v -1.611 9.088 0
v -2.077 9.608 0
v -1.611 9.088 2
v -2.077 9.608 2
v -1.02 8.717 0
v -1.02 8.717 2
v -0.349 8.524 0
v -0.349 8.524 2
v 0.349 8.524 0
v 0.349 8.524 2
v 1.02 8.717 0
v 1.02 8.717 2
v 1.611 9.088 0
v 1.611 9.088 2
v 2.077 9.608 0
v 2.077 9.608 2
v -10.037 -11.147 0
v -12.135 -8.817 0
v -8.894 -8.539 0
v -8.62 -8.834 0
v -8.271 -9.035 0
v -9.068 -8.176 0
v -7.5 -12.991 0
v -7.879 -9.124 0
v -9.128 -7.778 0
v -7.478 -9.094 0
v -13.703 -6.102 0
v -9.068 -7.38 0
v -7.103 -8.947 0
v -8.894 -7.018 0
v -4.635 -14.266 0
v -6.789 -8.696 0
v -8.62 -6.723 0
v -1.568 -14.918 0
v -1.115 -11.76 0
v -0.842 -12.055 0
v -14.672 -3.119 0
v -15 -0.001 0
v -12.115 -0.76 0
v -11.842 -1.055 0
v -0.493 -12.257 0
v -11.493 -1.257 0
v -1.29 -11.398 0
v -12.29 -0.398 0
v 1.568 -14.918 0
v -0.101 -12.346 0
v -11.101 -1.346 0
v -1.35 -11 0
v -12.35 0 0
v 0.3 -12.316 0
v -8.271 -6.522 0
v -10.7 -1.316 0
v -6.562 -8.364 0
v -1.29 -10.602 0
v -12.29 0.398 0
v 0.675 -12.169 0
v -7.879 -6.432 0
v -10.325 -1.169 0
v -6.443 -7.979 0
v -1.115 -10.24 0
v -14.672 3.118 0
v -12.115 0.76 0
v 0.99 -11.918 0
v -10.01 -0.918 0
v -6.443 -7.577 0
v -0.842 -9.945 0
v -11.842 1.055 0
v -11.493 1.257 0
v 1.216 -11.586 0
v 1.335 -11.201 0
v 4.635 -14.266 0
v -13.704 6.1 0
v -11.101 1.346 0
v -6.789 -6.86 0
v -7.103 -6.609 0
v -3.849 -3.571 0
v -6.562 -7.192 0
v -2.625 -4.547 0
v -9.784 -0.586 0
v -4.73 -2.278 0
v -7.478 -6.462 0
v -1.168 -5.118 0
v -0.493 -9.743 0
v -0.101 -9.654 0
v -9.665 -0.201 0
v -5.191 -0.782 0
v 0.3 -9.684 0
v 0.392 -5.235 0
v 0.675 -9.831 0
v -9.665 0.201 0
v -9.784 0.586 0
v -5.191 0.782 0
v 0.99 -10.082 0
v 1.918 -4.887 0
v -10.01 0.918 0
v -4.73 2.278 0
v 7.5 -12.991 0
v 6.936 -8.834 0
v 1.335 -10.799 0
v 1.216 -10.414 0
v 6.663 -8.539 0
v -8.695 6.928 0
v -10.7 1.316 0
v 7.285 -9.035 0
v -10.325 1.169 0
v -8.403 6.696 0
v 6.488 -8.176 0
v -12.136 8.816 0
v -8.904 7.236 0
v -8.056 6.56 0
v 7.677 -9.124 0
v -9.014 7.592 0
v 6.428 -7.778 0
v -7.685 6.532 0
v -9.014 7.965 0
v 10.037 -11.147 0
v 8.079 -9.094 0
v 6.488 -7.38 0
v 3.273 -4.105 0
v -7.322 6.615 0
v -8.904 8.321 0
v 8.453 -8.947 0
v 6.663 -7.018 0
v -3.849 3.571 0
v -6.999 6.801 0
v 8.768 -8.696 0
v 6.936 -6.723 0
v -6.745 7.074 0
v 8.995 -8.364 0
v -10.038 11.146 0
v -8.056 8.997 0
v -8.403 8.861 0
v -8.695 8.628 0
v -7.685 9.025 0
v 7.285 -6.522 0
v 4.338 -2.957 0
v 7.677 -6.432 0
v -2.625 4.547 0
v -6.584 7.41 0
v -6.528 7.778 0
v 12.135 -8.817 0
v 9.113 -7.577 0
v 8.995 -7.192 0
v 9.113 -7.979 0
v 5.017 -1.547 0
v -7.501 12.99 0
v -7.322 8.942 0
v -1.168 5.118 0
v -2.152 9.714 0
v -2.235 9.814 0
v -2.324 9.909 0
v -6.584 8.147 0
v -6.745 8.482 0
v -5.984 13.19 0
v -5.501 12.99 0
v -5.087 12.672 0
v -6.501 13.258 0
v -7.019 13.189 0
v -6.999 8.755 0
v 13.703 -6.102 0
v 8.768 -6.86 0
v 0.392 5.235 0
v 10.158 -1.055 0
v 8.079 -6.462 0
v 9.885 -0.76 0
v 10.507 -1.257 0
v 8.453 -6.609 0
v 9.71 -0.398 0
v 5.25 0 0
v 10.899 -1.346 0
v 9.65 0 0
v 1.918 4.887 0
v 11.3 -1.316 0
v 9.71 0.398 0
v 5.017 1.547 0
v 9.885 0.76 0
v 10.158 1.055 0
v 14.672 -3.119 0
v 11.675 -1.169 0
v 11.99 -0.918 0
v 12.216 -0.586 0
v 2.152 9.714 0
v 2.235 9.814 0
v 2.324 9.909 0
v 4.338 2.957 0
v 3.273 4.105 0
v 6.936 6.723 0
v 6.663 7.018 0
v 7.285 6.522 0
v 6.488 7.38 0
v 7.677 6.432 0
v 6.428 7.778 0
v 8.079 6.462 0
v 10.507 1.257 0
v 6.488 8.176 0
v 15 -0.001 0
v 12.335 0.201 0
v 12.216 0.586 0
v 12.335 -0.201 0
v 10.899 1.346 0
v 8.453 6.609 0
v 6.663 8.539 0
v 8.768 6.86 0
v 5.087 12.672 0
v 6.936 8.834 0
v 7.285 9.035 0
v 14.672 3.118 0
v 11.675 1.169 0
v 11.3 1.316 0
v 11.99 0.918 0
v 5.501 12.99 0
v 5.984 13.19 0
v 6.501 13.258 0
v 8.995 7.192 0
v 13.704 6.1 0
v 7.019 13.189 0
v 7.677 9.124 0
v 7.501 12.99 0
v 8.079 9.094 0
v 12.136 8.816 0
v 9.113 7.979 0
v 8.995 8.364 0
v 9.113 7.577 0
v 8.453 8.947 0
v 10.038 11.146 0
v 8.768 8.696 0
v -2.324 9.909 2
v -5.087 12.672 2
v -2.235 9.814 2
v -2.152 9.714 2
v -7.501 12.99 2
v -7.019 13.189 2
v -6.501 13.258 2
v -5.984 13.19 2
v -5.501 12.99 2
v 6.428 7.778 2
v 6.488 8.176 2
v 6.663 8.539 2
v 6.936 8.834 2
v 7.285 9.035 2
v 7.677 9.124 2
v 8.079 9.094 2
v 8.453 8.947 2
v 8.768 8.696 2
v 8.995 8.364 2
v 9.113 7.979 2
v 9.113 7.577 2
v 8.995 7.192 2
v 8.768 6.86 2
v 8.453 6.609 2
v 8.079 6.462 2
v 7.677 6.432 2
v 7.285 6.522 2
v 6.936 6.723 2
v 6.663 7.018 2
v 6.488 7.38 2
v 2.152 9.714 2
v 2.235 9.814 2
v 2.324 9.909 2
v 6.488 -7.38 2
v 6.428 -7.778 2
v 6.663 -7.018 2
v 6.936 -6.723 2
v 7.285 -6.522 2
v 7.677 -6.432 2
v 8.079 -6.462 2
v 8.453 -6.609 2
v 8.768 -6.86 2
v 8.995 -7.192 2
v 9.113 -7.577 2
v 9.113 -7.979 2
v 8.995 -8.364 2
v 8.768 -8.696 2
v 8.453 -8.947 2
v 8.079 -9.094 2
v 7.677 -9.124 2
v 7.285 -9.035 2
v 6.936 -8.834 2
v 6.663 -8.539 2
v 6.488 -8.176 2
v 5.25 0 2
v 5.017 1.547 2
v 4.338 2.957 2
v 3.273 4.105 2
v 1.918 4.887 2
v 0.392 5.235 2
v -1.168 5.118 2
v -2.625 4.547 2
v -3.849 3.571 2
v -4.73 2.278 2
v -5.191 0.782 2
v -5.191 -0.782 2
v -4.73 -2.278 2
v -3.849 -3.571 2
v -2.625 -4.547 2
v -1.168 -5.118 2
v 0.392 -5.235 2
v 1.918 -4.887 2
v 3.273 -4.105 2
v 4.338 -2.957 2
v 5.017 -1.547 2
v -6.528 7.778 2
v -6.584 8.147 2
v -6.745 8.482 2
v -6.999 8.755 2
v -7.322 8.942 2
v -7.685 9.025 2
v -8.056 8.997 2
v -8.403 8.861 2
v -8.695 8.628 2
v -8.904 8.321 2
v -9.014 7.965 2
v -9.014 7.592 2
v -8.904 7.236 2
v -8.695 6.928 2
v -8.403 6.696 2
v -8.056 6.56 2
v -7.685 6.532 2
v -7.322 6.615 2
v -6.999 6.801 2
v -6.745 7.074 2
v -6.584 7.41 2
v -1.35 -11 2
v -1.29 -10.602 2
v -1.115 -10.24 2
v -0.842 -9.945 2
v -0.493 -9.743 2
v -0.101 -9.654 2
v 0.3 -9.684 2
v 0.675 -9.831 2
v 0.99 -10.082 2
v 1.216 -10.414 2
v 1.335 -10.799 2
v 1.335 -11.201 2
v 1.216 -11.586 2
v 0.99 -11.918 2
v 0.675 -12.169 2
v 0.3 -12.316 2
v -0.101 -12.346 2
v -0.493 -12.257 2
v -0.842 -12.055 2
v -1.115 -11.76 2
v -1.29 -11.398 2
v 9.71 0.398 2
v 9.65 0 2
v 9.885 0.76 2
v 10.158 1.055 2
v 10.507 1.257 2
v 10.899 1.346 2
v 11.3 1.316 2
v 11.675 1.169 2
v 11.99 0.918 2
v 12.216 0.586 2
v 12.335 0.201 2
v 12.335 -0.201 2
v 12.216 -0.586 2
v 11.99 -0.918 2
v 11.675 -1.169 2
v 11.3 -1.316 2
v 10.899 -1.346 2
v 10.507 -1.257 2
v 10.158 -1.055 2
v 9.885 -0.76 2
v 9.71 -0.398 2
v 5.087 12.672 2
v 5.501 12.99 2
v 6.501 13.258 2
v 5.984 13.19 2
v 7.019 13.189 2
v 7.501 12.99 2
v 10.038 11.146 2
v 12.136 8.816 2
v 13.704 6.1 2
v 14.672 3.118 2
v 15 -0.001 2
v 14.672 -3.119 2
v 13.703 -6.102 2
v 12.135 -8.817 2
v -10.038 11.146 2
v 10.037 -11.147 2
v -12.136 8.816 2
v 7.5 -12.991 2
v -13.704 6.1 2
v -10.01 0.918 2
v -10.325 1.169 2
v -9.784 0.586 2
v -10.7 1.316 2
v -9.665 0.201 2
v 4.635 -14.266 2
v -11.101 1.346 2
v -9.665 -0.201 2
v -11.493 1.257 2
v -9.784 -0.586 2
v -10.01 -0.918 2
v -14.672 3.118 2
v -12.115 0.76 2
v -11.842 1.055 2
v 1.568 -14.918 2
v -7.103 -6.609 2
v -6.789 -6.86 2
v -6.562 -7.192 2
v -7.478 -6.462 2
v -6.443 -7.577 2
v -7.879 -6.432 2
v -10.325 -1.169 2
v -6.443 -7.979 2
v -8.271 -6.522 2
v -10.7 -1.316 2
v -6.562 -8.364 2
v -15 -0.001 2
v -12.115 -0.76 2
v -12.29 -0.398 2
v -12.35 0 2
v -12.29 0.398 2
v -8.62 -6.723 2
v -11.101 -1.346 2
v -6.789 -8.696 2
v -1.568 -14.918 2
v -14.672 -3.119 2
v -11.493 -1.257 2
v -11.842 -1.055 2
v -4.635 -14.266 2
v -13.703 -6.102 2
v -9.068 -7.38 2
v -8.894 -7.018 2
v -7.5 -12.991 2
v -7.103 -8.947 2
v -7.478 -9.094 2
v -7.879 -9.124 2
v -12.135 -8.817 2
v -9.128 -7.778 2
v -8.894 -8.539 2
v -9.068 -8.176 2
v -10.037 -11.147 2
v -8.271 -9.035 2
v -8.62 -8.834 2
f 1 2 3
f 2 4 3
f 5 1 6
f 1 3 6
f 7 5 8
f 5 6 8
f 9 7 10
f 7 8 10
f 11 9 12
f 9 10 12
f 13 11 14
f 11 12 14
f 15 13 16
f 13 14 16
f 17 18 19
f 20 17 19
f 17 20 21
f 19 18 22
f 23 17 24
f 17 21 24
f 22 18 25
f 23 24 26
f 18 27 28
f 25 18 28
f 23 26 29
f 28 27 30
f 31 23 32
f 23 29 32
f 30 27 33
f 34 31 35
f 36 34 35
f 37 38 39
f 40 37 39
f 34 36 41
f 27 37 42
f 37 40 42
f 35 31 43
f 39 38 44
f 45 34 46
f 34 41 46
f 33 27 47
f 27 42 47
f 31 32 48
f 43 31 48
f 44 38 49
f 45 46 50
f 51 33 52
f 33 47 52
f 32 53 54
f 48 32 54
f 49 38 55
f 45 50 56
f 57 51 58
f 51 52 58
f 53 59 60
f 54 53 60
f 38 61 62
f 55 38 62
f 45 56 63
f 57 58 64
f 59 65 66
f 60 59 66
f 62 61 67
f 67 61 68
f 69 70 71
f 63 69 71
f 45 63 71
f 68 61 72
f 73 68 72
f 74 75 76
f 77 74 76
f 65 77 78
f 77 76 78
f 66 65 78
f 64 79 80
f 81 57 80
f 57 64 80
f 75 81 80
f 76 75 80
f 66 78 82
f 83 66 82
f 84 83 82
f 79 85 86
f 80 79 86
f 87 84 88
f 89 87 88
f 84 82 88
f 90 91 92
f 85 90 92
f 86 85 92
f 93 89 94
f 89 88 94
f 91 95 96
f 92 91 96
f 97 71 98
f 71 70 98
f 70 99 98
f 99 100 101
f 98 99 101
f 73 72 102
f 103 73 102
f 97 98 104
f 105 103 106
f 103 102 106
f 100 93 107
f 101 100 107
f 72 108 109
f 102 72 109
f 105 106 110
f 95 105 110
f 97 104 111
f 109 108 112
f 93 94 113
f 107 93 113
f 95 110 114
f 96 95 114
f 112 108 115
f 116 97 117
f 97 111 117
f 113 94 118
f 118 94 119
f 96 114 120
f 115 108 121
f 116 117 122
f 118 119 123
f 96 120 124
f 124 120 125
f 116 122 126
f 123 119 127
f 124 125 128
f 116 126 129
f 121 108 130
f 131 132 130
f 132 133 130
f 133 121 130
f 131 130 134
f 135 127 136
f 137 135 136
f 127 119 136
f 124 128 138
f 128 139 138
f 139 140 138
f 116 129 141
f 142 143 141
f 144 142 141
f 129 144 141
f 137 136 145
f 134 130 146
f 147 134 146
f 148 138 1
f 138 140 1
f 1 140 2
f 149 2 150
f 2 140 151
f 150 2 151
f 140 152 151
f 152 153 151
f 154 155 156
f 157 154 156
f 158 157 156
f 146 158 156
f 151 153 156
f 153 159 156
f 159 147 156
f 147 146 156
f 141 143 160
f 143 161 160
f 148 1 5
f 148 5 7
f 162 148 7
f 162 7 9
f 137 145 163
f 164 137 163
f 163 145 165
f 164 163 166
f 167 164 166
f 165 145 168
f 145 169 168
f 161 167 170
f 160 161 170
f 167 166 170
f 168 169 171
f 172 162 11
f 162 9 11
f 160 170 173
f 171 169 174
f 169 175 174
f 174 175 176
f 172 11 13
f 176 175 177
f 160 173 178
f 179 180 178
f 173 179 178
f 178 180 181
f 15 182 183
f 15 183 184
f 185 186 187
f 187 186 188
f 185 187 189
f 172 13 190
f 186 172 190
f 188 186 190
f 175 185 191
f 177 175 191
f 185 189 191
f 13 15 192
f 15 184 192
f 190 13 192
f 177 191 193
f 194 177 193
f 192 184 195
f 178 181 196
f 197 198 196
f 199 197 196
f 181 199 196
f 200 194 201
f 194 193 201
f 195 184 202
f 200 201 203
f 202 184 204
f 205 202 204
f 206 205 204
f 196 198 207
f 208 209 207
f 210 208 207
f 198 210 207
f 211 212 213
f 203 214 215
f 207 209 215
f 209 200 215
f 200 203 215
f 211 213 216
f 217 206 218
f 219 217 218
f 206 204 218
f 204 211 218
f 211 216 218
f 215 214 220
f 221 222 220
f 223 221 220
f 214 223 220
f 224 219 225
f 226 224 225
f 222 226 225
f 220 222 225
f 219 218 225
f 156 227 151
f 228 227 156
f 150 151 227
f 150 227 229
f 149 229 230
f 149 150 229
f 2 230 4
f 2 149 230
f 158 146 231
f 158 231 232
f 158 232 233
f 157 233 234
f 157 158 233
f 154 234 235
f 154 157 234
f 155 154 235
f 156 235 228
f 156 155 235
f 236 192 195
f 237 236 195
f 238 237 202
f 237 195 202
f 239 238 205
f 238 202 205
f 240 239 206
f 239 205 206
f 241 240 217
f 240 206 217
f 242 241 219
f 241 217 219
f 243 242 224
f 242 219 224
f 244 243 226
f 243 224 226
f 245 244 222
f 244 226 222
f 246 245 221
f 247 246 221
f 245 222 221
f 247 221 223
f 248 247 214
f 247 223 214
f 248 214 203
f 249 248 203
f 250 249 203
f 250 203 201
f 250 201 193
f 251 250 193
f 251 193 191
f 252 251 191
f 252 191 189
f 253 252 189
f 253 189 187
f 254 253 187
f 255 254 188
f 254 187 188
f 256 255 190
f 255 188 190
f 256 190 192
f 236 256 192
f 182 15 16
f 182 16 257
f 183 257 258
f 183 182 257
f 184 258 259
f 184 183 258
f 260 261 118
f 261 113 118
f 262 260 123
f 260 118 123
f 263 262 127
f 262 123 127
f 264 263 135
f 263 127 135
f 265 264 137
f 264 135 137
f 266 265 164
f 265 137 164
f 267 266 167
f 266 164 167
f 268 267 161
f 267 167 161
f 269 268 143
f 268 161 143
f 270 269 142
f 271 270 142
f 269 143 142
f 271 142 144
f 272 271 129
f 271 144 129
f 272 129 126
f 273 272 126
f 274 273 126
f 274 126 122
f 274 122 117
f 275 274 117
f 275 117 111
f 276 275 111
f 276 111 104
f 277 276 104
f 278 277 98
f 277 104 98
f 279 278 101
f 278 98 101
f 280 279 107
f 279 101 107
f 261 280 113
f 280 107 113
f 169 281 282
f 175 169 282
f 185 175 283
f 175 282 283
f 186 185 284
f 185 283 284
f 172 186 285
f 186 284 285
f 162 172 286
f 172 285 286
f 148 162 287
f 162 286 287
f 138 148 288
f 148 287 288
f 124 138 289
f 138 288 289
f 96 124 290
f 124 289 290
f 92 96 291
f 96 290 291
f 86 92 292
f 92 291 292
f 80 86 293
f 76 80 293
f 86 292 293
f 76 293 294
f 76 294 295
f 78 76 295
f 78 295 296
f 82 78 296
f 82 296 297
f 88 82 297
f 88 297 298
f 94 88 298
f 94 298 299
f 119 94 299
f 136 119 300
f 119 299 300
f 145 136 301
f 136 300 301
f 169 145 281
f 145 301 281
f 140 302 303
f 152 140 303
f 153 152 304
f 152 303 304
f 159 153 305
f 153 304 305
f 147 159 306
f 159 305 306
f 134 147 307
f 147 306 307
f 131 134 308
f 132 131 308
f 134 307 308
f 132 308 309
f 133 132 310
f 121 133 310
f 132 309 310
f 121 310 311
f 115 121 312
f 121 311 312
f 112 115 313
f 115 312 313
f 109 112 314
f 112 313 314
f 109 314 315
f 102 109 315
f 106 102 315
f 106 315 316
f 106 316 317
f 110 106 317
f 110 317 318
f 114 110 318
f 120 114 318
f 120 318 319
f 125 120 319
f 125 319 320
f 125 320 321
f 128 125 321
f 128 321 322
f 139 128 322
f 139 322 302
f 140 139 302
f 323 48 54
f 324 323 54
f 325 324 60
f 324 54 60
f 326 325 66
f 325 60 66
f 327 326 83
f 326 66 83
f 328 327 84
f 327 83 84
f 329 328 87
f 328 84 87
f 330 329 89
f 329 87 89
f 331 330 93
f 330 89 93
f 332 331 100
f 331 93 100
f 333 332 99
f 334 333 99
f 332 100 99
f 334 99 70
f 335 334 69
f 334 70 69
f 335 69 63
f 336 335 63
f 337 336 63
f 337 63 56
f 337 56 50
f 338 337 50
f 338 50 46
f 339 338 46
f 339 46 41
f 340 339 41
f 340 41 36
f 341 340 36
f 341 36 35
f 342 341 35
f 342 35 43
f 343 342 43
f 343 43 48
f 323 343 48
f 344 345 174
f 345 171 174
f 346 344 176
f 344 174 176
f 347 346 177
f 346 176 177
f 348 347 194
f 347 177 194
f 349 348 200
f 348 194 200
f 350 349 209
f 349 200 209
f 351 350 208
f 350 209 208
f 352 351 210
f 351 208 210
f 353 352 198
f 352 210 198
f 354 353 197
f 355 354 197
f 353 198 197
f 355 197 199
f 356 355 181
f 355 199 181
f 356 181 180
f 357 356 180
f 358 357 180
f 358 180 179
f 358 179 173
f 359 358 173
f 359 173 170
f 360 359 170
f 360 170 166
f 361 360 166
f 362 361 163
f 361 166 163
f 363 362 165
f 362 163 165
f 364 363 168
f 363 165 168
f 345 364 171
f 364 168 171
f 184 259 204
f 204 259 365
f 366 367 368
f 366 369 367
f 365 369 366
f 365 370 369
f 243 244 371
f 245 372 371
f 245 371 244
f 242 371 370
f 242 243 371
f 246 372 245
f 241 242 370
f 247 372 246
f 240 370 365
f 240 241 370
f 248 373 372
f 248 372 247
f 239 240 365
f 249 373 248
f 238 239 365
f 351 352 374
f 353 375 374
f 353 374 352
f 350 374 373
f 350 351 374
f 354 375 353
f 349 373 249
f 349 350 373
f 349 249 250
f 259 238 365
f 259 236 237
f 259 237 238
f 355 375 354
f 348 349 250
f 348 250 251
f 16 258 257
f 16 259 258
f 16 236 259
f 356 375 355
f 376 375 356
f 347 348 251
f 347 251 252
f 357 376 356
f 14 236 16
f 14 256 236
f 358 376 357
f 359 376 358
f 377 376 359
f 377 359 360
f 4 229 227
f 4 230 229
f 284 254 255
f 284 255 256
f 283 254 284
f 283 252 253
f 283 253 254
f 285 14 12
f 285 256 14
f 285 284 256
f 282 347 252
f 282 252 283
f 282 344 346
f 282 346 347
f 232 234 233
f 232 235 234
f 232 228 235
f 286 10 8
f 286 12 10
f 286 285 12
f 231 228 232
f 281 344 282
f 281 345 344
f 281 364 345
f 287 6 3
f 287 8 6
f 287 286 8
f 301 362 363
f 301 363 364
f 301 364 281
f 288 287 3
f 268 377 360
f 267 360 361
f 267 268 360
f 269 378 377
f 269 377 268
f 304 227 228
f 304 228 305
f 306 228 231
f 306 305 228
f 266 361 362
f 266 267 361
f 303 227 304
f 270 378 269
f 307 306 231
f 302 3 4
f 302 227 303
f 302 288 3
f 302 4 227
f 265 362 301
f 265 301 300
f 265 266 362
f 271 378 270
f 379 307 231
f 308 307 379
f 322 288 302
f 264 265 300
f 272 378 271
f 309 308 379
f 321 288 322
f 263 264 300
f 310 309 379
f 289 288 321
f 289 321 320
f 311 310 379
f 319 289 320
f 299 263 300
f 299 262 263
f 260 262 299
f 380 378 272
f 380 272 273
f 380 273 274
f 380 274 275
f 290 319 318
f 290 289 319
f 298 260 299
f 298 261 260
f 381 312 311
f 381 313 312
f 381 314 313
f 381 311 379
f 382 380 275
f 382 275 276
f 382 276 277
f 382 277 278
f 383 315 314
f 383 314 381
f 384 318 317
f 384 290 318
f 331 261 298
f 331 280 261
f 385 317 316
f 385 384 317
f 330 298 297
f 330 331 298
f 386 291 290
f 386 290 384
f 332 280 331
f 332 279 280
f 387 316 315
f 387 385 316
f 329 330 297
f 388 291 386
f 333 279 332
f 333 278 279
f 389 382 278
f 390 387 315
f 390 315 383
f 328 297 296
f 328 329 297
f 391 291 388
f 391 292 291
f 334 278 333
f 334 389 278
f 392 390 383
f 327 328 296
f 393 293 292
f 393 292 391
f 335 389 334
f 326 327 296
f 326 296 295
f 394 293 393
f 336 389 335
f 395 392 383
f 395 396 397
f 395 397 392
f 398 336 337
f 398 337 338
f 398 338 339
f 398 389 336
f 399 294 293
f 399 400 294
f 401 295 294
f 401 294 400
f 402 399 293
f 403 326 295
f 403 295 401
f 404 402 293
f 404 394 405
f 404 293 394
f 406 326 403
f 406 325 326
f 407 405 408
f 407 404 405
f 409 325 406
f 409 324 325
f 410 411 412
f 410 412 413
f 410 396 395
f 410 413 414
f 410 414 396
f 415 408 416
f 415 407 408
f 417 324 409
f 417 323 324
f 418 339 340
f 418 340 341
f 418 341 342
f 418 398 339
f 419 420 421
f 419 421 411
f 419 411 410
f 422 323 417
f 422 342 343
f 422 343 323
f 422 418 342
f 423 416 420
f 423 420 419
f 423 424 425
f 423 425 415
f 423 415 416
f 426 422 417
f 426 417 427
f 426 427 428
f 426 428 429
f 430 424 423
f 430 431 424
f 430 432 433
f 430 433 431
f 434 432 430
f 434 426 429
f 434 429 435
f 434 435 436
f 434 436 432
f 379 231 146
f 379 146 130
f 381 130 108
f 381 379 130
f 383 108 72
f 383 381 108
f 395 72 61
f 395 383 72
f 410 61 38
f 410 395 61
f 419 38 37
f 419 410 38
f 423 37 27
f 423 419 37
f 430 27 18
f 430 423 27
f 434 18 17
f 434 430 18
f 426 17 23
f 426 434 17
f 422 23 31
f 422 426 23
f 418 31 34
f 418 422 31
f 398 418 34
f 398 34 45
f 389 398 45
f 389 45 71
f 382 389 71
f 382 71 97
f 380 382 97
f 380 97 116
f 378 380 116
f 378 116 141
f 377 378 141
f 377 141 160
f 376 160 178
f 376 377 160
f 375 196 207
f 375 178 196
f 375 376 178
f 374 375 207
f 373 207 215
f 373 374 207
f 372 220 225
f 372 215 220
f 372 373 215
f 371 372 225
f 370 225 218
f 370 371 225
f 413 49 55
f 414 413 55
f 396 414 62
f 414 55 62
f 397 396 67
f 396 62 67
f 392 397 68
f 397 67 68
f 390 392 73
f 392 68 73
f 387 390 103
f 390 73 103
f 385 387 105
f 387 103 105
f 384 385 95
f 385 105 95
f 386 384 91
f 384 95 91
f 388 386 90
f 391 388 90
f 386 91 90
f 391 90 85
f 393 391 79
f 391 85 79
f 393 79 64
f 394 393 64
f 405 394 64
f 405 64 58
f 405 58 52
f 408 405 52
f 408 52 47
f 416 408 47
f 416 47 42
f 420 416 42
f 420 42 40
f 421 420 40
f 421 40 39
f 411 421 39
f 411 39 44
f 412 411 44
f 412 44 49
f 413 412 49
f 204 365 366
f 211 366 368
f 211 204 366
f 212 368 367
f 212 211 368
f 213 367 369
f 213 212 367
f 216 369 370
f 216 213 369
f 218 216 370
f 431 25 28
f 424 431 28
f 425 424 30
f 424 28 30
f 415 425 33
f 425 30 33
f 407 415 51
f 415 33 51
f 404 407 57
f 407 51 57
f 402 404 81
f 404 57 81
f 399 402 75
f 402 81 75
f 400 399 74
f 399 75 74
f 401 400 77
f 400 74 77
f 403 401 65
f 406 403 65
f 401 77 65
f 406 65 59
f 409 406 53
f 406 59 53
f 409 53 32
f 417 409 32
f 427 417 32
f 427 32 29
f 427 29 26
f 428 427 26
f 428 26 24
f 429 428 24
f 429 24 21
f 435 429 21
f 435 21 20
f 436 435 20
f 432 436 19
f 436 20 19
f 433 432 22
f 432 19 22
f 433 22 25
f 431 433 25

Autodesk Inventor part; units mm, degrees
ref_plane "YZ Plane" through (0, 0, 0) normal (1, 0, 0) x (0, 1, 0)
ref_plane "XZ Plane" through (0, 0, 0) normal (0, 1, 0) x (-1, 0, 0)
ref_plane "XY Plane" through (0, 0, 0) normal (0, 0, 1) x (1, 0, 0)
sketch "Sketch1" plane through (0, 0, 0) normal (0, 0, 1) x (1, 0, 0)
  circle A0 centre (0, 0) radius 18
  dimension "d0" = 36
extrude "Extrusion1" add sketch "Sketch1" along normal blind 2.5
sketch "Sketch2" plane through (0, 0, 2.5) normal (0, 0, 1) x (1, 0, 0)
  line L0 (0, 0) -> (0, 11)
  circle A0 centre (0, 11) radius 1.25
  circle A1 centre (0, 0) radius 5
  circle A2 centre (7.7782, 7.7782) radius 1.25
  circle A3 centre (11, 0) radius 1.25
  circle A4 centre (7.7782, -7.7782) radius 1.25
  circle A5 centre (0, -11) radius 1.25
  circle A6 centre (-7.7782, -7.7782) radius 1.25
  circle A7 centre (-11, 0) radius 1.25
  circle A8 centre (-7.7782, 7.7782) radius 1.25
  dimension "d3" = 11
  dimension "d4" = 2.5
  dimension "d5" = 10
  dimension "d8" = 360
extrude "Extrusion2" cut sketch "Sketch2" against normal through all
sketch "Sketch3" plane through (0, 0, 2.5) normal (0, 0, 1) x (1, 0, 0)
  circle A0 centre (0, 0) radius 15
  circle A1 centre (0, 0) radius 18
  dimension "d12" = 30
extrude "Extrusion3" cut sketch "Sketch3" against normal through all
sketch "Sketch4" plane through (0, 0, 2.5) normal (0, 0, 1) x (1, 0, 0)
  circle A0 centre (0, 11) radius 1.25 projected
  arc A1 (-2.1651, 9.75) -> (2.1651, 9.75) centre (0, 11) ccw
  circle A2 centre (-7.7782, 7.7782) radius 1.25 projected
  circle A3 centre (7.7782, 7.7782) radius 1.25 projected
  circle A4 centre (0, 0) radius 5 projected
  line L0 (2.1651, 9.75) -> (6.1129, 13.6979)
  circle A5 centre (0, 0) radius 15 projected
  line L1 (2.1651, 9.75) -> (7.7482, 9.75) construction
  line L2 (-2.1651, 9.75) -> (-6.1129, 13.6979)
  line L3 (-2.1651, 9.75) -> (3.4181, 9.75) construction
  arc A6 (6.1129, 13.6979) -> (-6.1129, 13.6979) centre (0, 0) ccw
  dimension "d15" = 5
  dimension "d17" = 45
  dimension "d18" = 135
extrude "Extrusion4" cut sketch "Sketch4" against normal blind 10 contours L2 A5 L0 A1 picked at (3.4839, 13.2226)
fillet "Fillet1" radius 2 4 edges at (-6.1129, 13.6979, 1.25) (6.1129, 13.6979, 1.25) (-2.1651, 9.75, 1.25) (2.1651, 9.75, 1.25)
sketch "Sketch5" plane through (0, 0, 2.5) normal (0, 0, 1) x (1, 0, 0)
  line L0 (0, 0) -> (1, 0)
  line L1 (1, 0) -> (1, 1)
  line L2 (1, 1) -> (0, 1)
  line L3 (0, 1) -> (0, 0)
  dimension "d22" = 1
  dimension "d23" = 1
extrude "Extrusion5" add sketch "Sketch5" along normal blind 1
sketch "Sketch6" plane through (0, 1, 2.5) normal (0, 1, 0) x (1, 0, 0)
  line L0 (2.0766, 0) -> (-2.0766, 0) projected
  line L1 (-15, 2.5) -> (-15, 0) projected
  line L2 (0, 0) -> (-15, 0)
  line L3 (-15, 0) -> (-15, 0.5)
  line L4 (-15, 0.5) -> (0, 0.5)
  line L5 (0, 0.5) -> (0, 0)
  line L6 (0, 0) -> (15, 0)
  line L7 (15, 0) -> (15, 0.5)
  line L8 (15, 0.5) -> (0, 0.5)
  line L9 (0, 0.5) -> (0, 0)
  point P0 (0, 2.5)
  point P1 (0, 0.5)
  dimension "d26" = 0.5
  dimension "d27" = 15
extrude "Extrusion6" cut sketch "Sketch6" along normal through all both and the other way through all
sketch "Sketch7" plane through (0, 0, 3.5) normal (0, 0, 1) x (1, 0, 0)
  line L0 (1, 1) -> (0, 1) projected
  line L1 (0, 0) -> (1, 0) projected
  line L2 (0, 1) -> (1, 1)
  line L3 (1, 1) -> (1, 0)
  line L4 (1, 0) -> (0, 0)
  line L5 (0, 0) -> (0, 1)
extrude "Extrusion7" cut sketch "Sketch7" against normal blind 1
sketch "Sketch8" plane through (0, 0, 2) normal (0, 0, 1) x (1, 0, 0)
  circle A0 centre (0, 0) radius 5.25
  dimension "d32" = 10.5
extrude "Extrusion8" cut sketch "Sketch8" against normal through all
sketch "Sketch9" plane through (0, 0, 0) normal (0, 0, -1) x (-1, 0, 0)
  circle A0 centre (0, -11) radius 1.25 projected
  circle A1 centre (0, -11) radius 1.35
  circle A2 centre (-7.7782, -7.7782) radius 1.25 projected
  circle A3 centre (-7.7782, -7.7782) radius 1.35
  circle A4 centre (-11, 0) radius 1.25 projected
  circle A5 centre (-11, 0) radius 1.35
  circle A6 centre (-7.7782, 7.7782) radius 1.25 projected
  circle A7 centre (-7.7782, 7.7782) radius 1.35
  circle A8 centre (7.7782, -7.7782) radius 1.25 projected
  circle A9 centre (7.7782, -7.7782) radius 1.35
  circle A10 centre (11, 0) radius 1.25 projected
  circle A11 centre (11, 0) radius 1.35
  circle A12 centre (7.7782, 7.7782) radius 1.25 projected
  circle A13 centre (7.7782, 7.7782) radius 1.35
  point P0 (0, 0)
  dimension "d35" = 2.7
  dimension "d36" = 2.7
  dimension "d37" = 2.7
  dimension "d38" = 2.7
  dimension "d39" = 2.7
  dimension "d40" = 2.7
  dimension "d41" = 2.7
extrude "Extrusion9" cut sketch "Sketch9" against normal through all contours A1 | A3 | A5 | A7 | A9 | A10 | A11
properties part number "Pulley_middle"
